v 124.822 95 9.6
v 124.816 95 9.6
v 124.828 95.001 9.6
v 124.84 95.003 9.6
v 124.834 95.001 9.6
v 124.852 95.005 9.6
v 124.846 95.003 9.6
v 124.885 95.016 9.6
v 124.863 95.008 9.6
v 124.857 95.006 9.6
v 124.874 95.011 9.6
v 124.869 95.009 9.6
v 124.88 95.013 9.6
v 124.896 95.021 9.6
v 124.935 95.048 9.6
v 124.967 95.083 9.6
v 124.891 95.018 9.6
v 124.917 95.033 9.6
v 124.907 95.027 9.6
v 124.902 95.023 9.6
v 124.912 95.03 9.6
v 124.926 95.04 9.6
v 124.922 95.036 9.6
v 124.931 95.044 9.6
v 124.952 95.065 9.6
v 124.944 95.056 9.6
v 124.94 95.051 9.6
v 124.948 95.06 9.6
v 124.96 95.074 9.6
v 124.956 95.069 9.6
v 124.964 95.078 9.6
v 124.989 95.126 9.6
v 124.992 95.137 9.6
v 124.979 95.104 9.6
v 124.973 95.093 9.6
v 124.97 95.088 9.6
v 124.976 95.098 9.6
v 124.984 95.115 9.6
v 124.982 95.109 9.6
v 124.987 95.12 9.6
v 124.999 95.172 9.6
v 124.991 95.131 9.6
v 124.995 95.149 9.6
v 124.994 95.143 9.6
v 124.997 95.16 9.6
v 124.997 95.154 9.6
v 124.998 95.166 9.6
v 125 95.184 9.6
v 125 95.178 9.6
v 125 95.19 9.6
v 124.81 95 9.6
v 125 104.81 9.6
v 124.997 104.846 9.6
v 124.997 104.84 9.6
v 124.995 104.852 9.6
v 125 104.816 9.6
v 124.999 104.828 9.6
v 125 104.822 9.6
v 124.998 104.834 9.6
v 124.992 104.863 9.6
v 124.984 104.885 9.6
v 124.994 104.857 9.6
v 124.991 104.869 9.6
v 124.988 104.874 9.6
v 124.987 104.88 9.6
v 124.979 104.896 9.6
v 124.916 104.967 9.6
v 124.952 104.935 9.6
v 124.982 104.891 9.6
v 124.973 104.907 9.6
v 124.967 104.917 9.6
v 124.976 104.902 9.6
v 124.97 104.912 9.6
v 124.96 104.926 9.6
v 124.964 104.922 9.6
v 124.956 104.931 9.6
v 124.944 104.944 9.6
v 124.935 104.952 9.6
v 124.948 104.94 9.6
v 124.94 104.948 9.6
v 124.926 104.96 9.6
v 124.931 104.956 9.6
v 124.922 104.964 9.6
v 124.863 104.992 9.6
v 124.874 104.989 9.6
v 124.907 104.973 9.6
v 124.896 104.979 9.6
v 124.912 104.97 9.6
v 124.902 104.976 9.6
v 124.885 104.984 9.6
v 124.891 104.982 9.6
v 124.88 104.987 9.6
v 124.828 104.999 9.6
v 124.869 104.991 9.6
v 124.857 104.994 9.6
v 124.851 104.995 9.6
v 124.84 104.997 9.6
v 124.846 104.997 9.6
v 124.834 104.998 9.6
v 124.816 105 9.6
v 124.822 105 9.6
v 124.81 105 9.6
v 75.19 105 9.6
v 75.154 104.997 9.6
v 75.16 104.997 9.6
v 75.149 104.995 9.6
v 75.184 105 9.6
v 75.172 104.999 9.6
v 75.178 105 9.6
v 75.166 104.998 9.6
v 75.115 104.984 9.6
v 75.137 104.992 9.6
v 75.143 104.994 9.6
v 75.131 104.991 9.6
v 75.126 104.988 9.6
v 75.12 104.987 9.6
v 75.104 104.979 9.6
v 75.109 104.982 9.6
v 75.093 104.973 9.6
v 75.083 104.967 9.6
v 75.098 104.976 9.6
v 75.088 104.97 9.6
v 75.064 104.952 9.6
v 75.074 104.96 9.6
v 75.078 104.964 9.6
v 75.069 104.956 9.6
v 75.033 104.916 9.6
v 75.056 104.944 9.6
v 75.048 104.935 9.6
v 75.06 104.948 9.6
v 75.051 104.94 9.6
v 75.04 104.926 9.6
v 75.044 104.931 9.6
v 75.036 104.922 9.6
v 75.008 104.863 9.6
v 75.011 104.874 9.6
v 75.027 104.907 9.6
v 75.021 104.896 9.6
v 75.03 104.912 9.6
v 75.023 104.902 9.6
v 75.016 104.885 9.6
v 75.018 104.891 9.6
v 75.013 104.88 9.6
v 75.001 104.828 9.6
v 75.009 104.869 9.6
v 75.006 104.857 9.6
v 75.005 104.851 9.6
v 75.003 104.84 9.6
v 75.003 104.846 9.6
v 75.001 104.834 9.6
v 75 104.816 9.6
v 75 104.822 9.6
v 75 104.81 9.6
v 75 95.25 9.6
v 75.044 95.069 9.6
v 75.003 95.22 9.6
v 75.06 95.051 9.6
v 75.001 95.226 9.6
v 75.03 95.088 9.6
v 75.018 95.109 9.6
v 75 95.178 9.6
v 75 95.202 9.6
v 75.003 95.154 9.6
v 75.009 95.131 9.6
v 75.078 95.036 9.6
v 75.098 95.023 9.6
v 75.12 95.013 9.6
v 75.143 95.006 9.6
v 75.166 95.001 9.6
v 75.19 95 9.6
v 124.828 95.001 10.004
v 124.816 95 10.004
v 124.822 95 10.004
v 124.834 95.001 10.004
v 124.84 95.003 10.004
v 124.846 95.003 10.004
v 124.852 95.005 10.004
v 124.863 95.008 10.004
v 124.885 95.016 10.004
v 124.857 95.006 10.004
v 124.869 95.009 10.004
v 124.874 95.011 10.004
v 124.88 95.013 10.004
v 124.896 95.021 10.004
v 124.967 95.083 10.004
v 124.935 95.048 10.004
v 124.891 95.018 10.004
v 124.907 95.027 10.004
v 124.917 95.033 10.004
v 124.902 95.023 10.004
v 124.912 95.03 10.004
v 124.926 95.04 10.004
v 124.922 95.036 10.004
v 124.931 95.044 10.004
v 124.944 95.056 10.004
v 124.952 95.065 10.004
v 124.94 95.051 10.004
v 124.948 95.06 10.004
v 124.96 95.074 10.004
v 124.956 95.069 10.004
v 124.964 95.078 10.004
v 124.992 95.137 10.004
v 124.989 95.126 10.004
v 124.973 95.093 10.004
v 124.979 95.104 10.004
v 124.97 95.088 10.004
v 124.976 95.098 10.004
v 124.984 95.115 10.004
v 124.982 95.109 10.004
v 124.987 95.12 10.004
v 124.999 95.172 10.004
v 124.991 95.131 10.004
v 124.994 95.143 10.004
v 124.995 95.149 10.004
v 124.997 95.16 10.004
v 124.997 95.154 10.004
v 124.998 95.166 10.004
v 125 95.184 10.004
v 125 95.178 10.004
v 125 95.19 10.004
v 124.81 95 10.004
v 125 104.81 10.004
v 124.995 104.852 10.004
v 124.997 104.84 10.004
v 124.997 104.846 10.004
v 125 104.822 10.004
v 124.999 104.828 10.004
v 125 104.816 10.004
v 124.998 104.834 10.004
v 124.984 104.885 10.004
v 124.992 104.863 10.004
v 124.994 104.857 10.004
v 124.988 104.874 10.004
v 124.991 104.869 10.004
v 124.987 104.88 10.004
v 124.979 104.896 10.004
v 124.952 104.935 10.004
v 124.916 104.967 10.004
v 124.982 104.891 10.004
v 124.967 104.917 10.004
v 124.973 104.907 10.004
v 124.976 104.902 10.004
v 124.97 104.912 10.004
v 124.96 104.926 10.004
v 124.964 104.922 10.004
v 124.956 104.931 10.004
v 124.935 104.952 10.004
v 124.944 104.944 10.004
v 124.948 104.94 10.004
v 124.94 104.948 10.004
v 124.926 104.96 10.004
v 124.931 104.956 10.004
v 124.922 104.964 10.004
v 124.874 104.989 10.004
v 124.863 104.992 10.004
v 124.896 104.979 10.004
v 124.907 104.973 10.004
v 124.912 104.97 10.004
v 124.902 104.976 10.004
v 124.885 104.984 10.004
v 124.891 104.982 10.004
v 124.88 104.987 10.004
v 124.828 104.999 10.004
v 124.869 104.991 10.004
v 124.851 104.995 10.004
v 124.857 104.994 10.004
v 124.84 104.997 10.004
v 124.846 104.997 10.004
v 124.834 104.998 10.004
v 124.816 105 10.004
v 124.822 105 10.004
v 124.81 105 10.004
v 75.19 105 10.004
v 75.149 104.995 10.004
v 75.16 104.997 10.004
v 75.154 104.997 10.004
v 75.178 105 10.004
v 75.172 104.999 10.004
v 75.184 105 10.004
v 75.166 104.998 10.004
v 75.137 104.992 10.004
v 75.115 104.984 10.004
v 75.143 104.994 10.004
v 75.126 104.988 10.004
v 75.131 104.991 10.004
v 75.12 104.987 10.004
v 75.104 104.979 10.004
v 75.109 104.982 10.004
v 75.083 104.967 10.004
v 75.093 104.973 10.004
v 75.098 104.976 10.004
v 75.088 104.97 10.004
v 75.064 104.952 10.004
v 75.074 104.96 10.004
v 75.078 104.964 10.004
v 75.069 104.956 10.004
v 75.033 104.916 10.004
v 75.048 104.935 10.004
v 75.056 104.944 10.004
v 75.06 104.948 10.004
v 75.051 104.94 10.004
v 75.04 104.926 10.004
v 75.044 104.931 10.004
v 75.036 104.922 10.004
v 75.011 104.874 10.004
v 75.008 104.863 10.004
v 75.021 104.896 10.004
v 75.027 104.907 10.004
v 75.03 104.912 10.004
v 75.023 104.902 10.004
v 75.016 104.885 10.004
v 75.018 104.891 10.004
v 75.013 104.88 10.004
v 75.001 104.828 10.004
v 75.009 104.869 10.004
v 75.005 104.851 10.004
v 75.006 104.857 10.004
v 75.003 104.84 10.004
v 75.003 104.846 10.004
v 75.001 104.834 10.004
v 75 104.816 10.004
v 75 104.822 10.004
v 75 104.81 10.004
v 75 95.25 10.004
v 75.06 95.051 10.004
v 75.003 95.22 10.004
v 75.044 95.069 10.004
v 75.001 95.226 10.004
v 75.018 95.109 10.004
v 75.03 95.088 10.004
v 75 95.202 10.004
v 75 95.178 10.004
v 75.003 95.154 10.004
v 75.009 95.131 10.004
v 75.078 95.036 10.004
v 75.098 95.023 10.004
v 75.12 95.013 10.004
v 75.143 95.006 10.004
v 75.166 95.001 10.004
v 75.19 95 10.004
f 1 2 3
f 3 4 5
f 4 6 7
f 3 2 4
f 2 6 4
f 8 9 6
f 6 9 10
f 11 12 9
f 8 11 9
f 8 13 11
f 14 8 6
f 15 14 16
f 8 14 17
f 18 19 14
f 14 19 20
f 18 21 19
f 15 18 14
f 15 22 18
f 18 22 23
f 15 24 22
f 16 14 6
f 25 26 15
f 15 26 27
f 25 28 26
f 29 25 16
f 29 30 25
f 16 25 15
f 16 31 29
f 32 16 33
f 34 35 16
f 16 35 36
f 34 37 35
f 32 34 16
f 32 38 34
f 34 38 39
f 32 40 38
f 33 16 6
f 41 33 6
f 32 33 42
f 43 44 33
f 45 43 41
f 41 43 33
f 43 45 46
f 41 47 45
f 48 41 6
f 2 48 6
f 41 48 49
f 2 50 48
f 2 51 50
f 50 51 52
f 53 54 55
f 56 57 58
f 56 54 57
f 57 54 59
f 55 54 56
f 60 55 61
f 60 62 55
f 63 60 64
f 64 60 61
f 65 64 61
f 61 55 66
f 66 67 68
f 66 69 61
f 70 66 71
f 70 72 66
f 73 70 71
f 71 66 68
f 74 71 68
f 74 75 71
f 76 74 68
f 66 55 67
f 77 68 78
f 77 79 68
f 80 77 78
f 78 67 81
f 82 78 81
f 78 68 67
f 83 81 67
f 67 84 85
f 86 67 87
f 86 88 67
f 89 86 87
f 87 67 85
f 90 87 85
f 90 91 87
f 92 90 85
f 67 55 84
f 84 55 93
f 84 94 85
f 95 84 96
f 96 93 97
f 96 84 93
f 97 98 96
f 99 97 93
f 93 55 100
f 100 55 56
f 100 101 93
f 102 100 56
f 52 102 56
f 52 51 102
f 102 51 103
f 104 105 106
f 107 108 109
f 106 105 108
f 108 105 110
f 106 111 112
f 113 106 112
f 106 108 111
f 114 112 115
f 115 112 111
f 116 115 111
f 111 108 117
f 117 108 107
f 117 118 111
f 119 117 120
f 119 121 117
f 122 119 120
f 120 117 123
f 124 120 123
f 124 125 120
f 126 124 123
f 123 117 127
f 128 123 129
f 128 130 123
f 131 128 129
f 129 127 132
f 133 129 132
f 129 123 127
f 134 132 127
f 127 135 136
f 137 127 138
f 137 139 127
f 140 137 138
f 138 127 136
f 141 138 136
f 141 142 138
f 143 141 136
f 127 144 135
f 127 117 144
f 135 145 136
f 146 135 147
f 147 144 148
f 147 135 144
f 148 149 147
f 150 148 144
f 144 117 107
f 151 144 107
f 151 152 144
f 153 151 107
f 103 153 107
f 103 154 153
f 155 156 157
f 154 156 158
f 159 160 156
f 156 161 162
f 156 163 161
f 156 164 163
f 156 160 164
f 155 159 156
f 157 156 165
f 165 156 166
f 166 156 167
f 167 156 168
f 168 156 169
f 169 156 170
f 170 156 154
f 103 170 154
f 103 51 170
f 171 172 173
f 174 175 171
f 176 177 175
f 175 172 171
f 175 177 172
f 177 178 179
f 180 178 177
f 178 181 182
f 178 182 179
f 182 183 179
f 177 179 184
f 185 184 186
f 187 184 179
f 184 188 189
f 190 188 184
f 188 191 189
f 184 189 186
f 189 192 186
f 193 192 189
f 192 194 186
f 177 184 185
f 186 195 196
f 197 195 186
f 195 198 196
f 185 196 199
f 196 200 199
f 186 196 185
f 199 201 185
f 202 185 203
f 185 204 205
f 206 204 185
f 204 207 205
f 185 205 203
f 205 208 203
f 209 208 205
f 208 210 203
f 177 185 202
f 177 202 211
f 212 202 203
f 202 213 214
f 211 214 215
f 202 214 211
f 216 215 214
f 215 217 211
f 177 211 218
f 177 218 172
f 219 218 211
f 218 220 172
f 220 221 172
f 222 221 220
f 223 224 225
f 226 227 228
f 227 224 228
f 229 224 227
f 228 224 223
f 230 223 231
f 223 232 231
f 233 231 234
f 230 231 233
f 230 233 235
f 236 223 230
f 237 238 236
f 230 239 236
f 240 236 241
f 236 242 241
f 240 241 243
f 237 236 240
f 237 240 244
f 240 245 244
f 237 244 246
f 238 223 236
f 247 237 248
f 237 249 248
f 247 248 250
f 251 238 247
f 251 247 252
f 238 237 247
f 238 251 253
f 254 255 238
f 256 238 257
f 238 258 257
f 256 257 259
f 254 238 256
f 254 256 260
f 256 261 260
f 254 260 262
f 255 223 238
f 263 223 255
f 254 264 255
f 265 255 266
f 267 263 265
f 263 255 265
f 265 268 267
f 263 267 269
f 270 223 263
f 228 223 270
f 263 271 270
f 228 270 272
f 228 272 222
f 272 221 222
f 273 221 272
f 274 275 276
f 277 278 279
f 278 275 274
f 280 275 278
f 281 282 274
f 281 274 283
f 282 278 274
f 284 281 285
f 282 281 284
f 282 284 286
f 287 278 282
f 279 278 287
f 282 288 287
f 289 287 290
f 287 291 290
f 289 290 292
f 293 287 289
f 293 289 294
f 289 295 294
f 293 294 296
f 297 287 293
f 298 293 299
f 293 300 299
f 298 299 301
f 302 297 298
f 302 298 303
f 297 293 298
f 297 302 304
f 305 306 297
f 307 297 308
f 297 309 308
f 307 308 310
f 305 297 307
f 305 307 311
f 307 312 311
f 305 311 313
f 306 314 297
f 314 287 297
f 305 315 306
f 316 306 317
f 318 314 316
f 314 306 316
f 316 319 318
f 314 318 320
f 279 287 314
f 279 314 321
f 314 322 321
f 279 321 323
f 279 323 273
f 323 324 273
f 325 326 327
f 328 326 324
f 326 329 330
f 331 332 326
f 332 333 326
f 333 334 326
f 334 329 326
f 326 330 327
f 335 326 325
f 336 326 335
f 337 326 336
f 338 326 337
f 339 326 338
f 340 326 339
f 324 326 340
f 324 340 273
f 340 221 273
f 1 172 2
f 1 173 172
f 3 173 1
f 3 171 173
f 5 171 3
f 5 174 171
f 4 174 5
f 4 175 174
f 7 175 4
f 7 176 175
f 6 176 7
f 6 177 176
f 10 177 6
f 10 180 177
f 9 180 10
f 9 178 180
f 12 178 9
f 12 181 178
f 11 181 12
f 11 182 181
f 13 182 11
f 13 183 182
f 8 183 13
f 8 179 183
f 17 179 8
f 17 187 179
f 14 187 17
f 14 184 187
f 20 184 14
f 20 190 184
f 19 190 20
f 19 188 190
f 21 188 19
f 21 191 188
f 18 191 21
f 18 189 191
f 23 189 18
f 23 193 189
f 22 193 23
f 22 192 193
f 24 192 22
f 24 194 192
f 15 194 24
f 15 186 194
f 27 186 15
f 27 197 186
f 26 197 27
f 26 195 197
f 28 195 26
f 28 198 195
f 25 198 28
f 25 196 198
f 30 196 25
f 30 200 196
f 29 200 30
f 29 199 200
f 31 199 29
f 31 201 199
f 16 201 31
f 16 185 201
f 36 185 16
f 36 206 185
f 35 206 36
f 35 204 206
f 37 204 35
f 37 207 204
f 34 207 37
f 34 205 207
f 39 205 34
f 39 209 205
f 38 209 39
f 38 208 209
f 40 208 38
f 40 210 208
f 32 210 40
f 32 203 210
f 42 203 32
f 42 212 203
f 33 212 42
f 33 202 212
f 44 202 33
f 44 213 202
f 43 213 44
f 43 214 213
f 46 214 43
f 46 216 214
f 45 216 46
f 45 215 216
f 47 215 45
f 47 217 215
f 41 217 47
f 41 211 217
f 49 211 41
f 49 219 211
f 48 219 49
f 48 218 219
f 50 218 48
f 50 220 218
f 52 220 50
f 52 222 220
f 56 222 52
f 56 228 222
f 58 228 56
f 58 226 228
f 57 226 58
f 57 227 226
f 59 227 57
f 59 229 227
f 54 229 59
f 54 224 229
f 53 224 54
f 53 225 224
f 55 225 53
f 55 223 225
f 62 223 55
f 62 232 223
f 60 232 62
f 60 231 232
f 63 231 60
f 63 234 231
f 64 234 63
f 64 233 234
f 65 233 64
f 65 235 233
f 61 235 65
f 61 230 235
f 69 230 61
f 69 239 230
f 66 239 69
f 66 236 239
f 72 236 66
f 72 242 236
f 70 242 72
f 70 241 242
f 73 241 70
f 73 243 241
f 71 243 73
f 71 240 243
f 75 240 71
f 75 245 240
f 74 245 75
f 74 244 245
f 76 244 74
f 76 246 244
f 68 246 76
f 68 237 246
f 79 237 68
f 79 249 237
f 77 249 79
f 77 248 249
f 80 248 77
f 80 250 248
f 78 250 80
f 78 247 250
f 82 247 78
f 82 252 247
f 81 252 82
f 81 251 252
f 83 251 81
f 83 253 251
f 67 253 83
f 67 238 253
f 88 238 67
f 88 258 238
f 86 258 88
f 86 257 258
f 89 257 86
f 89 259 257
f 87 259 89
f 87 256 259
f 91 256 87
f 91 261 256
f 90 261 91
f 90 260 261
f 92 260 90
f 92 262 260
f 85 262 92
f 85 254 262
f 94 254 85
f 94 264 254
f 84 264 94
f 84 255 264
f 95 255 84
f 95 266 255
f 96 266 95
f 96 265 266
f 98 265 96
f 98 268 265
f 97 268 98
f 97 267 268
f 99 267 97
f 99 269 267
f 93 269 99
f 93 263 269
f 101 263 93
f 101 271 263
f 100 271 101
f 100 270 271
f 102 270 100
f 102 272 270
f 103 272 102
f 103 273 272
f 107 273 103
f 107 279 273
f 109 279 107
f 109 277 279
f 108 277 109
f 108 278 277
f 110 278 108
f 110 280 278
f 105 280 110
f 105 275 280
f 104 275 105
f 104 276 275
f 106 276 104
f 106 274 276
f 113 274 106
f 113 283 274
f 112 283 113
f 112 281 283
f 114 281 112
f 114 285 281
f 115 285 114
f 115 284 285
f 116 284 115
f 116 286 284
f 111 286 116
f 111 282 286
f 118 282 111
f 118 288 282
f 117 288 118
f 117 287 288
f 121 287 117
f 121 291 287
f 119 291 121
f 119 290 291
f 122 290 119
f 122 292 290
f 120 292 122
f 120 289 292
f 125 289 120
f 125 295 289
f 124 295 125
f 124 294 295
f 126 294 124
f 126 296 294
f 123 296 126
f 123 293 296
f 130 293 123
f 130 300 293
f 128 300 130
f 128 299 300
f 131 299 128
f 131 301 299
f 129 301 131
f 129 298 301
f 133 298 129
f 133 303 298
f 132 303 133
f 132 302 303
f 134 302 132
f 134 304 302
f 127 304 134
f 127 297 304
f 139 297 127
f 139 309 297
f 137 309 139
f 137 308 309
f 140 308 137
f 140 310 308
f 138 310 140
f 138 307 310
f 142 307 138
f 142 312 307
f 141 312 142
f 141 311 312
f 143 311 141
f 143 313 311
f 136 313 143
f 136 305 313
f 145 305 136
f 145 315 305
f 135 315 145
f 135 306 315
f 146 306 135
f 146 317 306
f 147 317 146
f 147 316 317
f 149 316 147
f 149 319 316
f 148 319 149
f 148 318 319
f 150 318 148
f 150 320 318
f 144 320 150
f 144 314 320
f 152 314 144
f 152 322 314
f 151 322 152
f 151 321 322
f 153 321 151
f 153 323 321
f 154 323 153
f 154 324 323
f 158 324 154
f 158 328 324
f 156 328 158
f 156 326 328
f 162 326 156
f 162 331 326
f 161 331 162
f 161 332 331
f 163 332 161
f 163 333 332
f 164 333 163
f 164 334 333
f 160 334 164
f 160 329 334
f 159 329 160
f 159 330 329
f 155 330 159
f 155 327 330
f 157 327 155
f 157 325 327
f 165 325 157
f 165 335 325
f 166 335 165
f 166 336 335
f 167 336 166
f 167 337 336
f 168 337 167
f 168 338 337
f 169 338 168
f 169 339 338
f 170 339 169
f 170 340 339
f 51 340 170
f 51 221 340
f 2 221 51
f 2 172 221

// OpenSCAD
module drawBasicShape(x1, y1, x2, y2, width)
{
	length = sqrt((x1-x2)*(x1-x2) + (y1-y2)*(y1-y2));
	if (width!=0.0) {
		square(size = [width, length], center = false);
		translate([width/2.0, 0, 0]) circle(d=width);
		translate([width/2.0, length, 0]) circle(d=width);
	}
}

module translateAndRotate(x1, y1, x2, y2, width)
{
	if (width != 0.0) {
		angle = atan((y2-y1)/(x2-x1)) +270;
		if (x2>=x1) {
			translate([x1, y1, 0.0]) rotate([0.0, 0.0, angle]) translate([-width/2.0, 0.0, 0.0]) scale([1.0, 1.0, 1.0]) drawBasicShape(x1, y1, x2, y2, width);
		}
		else {
			translate([x1, y1, 0.0]) rotate([0.0, 0.0, angle+180]) translate([-width/2.0, 0.0, 0.0]) scale([1.0, 1.0, 1.0]) drawBasicShape(x1, y1, x2, y2, width);		}
	}
}

$fn=50;

points23 = [
[75.77800000, 95.77800000, 0.00000000],
[124.22200000, 95.77800000, 0.37999672],
[124.22200000, 104.22200000, 0.37997788],
[75.77800000, 104.22200000, 0.37999548],
[75.77800000, 95.83800000, 0.37998140],
[75.48400000, 95.48400000, 0.00000000],
[124.51600000, 95.48400000, 0.37999746],
[124.51600000, 104.51600000, 0.37998977],
[75.48400000, 104.51600000, 0.37999868],
[75.48400000, 95.54400000, 0.37998644],
[75.19000000, 95.19000000, 0.00000000],
[124.81000000, 95.19000000, 0.37999939],
[124.81000000, 104.81000000, 0.38000021],
[75.19000000, 104.81000000, 0.38000060],
[75.19000000, 95.25000000, 0.37999715],
[75.53600000, 95.39000000, 0.00000000],
[76.11100000, 95.94600000, 0.00000000],
[75.94600000, 96.11100000, 0.37961375],
[75.94600000, 96.52800000, 0.38001190],
[76.52800000, 95.94600000, 0.37989934],
[76.94500000, 95.94600000, 0.38015610],
[75.94600000, 96.94500000, 0.37994651],
[75.94600000, 97.36200000, 0.38001190],
[77.36200000, 95.94600000, 0.37999592],
[77.77900000, 95.94600000, 0.38001190],
[75.94600000, 97.77900000, 0.37999966],
[75.94600000, 98.19600000, 0.38015610],
[78.19600000, 95.94600000, 0.38000201],
[78.61300000, 95.94600000, 0.38001190],
[75.94600000, 98.61300000, 0.38001957],
[75.94600000, 99.03000000, 0.38001190],
[79.03000000, 95.94600000, 0.38001859],
[79.44700000, 95.94600000, 0.38015610],
[75.94600000, 99.44700000, 0.38001785],
[75.94600000, 99.86400000, 0.38001190],
[79.86400000, 95.94600000, 0.38002811],
[80.28100000, 95.94600000, 0.38001190],
[75.94600000, 100.28100000, 0.38002660],
[75.94600000, 100.69800000, 0.38001190],
[80.69800000, 95.94600000, 0.38003429],
[81.11500000, 95.94600000, 0.38001190],
[75.94600000, 101.11500000, 0.38003252],
[75.94600000, 101.53300000, 0.37930814],
[81.53300000, 95.94600000, 0.37997836],
[81.95000000, 95.94600000, 0.38001190],
[75.94600000, 101.95000000, 0.37998780],
[75.94600000, 102.36700000, 0.38001190],
[82.36700000, 95.94600000, 0.37998277],
[82.78400000, 95.94600000, 0.38015610],
[75.94600000, 102.78400000, 0.37999079],
[75.94600000, 103.20100000, 0.38001190],
[83.20100000, 95.94600000, 0.37999203],
[83.61800000, 95.94600000, 0.38001190],
[75.94600000, 103.61800000, 0.37999868],
[75.95600000, 104.02400000, 0.38048727],
[84.03500000, 95.94600000, 0.38000275],
[84.45200000, 95.94600000, 0.38001190],
[76.34400000, 104.05400000, 0.38000229],
[76.76100000, 104.05400000, 0.38015610],
[84.86900000, 95.94600000, 0.38000229],
[85.28600000, 95.94600000, 0.38001190],
[77.17800000, 104.05400000, 0.38000754],
[77.59500000, 104.05400000, 0.38001190],
[85.70300000, 95.94600000, 0.38000229],
[86.12000000, 95.94600000, 0.38001190],
[78.01200000, 104.05400000, 0.38000754],
[78.42900000, 104.05400000, 0.38001190],
[86.53700000, 95.94600000, 0.38000229],
[86.95400000, 95.94600000, 0.38015610],
[78.84600000, 104.05400000, 0.38000229],
[79.26300000, 104.05400000, 0.38001190],
[87.37100000, 95.94600000, 0.38000754],
[87.78900000, 95.94600000, 0.37930814],
[79.68000000, 104.05400000, 0.37998415],
[80.09700000, 104.05400000, 0.38001190],
[88.20600000, 95.94600000, 0.37998940],
[88.62300000, 95.94600000, 0.38001190],
[80.51500000, 104.05400000, 0.38000229],
[80.93200000, 104.05400000, 0.38015610],
[89.04000000, 95.94600000, 0.38000229],
[89.45700000, 95.94600000, 0.38001190],
[81.34900000, 104.05400000, 0.38000229],
[81.76600000, 104.05400000, 0.38015610],
[89.87400000, 95.94600000, 0.38000229],
[90.29100000, 95.94600000, 0.38001190],
[82.18300000, 104.05400000, 0.38000754],
[82.60000000, 104.05400000, 0.38001190],
[90.70800000, 95.94600000, 0.38000229],
[91.12500000, 95.94600000, 0.38015610],
[83.01700000, 104.05400000, 0.38000229],
[83.43400000, 104.05400000, 0.38001190],
[91.54200000, 95.94600000, 0.38000229],
[91.95900000, 95.94600000, 0.38015610],
[83.85100000, 104.05400000, 0.38000229],
[84.26800000, 104.05400000, 0.38001190],
[92.37600000, 95.94600000, 0.38000754],
[92.79300000, 95.94600000, 0.38001190],
[84.68500000, 104.05400000, 0.38000229],
[85.10200000, 104.05400000, 0.38001190],
[93.21000000, 95.94600000, 0.38000754],
[93.62700000, 95.94600000, 0.38001190],
[85.51900000, 104.05400000, 0.38000229],
[85.93600000, 104.05400000, 0.38015610],
[94.04400000, 95.94600000, 0.38000229],
[94.46200000, 95.94600000, 0.37930814],
[86.35300000, 104.05400000, 0.37998940],
[86.77000000, 104.05400000, 0.38001190],
[94.87900000, 95.94600000, 0.37998415],
[95.29600000, 95.94600000, 0.38001190],
[87.18800000, 104.05400000, 0.38000754],
[87.60500000, 104.05400000, 0.38001190],
[95.71300000, 95.94600000, 0.38000229],
[96.13000000, 95.94600000, 0.38015610],
[88.02200000, 104.05400000, 0.38000229],
[88.43900000, 104.05400000, 0.38001190],
[96.54700000, 95.94600000, 0.38000754],
[96.96400000, 95.94600000, 0.38001190],
[88.85600000, 104.05400000, 0.38000229],
[89.27300000, 104.05400000, 0.38001190],
[97.38100000, 95.94600000, 0.38000754],
[97.79800000, 95.94600000, 0.38001190],
[89.69000000, 104.05400000, 0.38000229],
[90.10700000, 104.05400000, 0.38015610],
[98.21500000, 95.94600000, 0.38000229],
[98.63200000, 95.94600000, 0.38001190],
[90.52400000, 104.05400000, 0.38000754],
[90.94100000, 104.05400000, 0.38001190],
[99.04900000, 95.94600000, 0.38000229],
[99.46600000, 95.94600000, 0.38001190],
[91.35800000, 104.05400000, 0.38000754],
[91.77500000, 104.05400000, 0.38001190],
[99.88300000, 95.94600000, 0.38000229],
[100.30000000, 95.94600000, 0.38015610],
[92.19200000, 104.05400000, 0.38000229],
[92.60900000, 104.05400000, 0.38001190],
[100.71800000, 95.94600000, 0.37998940],
[101.13500000, 95.94600000, 0.38001190],
[93.02600000, 104.05400000, 0.37998415],
[93.44400000, 104.05400000, 0.37930814],
[101.55200000, 95.94600000, 0.38000754],
[101.96900000, 95.94600000, 0.38001190],
[93.86100000, 104.05400000, 0.38000229],
[94.27800000, 104.05400000, 0.38015610],
[102.38600000, 95.94600000, 0.38000229],
[102.80300000, 95.94600000, 0.38001190],
[94.69500000, 104.05400000, 0.38000754],
[95.11200000, 104.05400000, 0.38001190],
[103.22000000, 95.94600000, 0.38000229],
[103.63700000, 95.94600000, 0.38001190],
[95.52900000, 104.05400000, 0.38000754],
[95.94600000, 104.05400000, 0.38001190],
[104.05400000, 95.94600000, 0.38000229],
[104.47100000, 95.94600000, 0.38015610],
[96.36300000, 104.05400000, 0.38000229],
[96.78000000, 104.05400000, 0.38001190],
[104.88800000, 95.94600000, 0.38000754],
[105.30500000, 95.94600000, 0.38001190],
[97.19700000, 104.05400000, 0.38000229],
[97.61400000, 104.05400000, 0.38001190],
[105.72200000, 95.94600000, 0.38000754],
[106.13900000, 95.94600000, 0.38001190],
[98.03100000, 104.05400000, 0.38000229],
[98.44800000, 104.05400000, 0.38015610],
[106.55600000, 95.94600000, 0.38000229],
[106.97300000, 95.94600000, 0.38001190],
[98.86500000, 104.05400000, 0.38000754],
[99.28200000, 104.05400000, 0.38001190],
[107.39100000, 95.94600000, 0.37998415],
[107.80800000, 95.94600000, 0.38001190],
[99.69900000, 104.05400000, 0.37998940],
[100.11700000, 104.05400000, 0.37930814],
[108.22500000, 95.94600000, 0.38000229],
[108.64200000, 95.94600000, 0.38015610],
[100.53400000, 104.05400000, 0.38000229],
[100.95100000, 104.05400000, 0.38001190],
[109.05900000, 95.94600000, 0.38000754],
[109.47600000, 95.94600000, 0.38001190],
[101.36800000, 104.05400000, 0.38000229],
[101.78500000, 104.05400000, 0.38001190],
[109.89300000, 95.94600000, 0.38000754],
[110.31000000, 95.94600000, 0.38001190],
[102.20200000, 104.05400000, 0.38000229],
[102.61900000, 104.05400000, 0.38015610],
[110.72700000, 95.94600000, 0.38000229],
[111.14400000, 95.94600000, 0.38001190],
[103.03600000, 104.05400000, 0.38000754],
[103.45300000, 104.05400000, 0.38001190],
[111.56100000, 95.94600000, 0.38000229],
[111.97800000, 95.94600000, 0.38001190],
[103.87000000, 104.05400000, 0.38000754],
[104.28700000, 104.05400000, 0.38001190],
[112.39500000, 95.94600000, 0.38000229],
[112.81200000, 95.94600000, 0.38015610],
[104.70400000, 104.05400000, 0.38000229],
[105.12100000, 104.05400000, 0.38001190],
[113.22900000, 95.94600000, 0.38000754],
[113.64700000, 95.94600000, 0.37930814],
[105.53800000, 104.05400000, 0.37998415],
[105.95500000, 104.05400000, 0.38001190],
[114.06400000, 95.94600000, 0.37998940],
[114.48100000, 95.94600000, 0.38001190],
[106.37300000, 104.05400000, 0.38000229],
[106.79000000, 104.05400000, 0.38015610],
[114.89800000, 95.94600000, 0.38000229],
[115.31500000, 95.94600000, 0.38001190],
[107.20700000, 104.05400000, 0.38000754],
[107.62400000, 104.05400000, 0.38001190],
[115.73200000, 95.94600000, 0.38000229],
[116.14900000, 95.94600000, 0.38001190],
[108.04100000, 104.05400000, 0.38000754],
[108.45800000, 104.05400000, 0.38001190],
[116.56600000, 95.94600000, 0.38000229],
[116.98300000, 95.94600000, 0.38015610],
[108.87500000, 104.05400000, 0.38000229],
[109.29200000, 104.05400000, 0.38001190],
[117.40000000, 95.94600000, 0.38000754],
[117.81700000, 95.94600000, 0.38001190],
[109.70900000, 104.05400000, 0.38000229],
[110.12600000, 104.05400000, 0.38001190],
[118.23400000, 95.94600000, 0.38000754],
[118.65100000, 95.94600000, 0.38001190],
[110.54300000, 104.05400000, 0.38000229],
[110.96000000, 104.05400000, 0.38015610],
[119.06800000, 95.94600000, 0.38000229],
[119.48500000, 95.94600000, 0.38001190],
[111.37700000, 104.05400000, 0.38000754],
[111.79400000, 104.05400000, 0.38001190],
[119.90200000, 95.94600000, 0.38000229],
[120.32000000, 95.94600000, 0.37930814],
[112.21100000, 104.05400000, 0.37998940],
[112.62900000, 104.05400000, 0.37930814],
[120.73700000, 95.94600000, 0.38000229],
[121.15400000, 95.94600000, 0.38015610],
[113.04600000, 104.05400000, 0.38000229],
[113.46300000, 104.05400000, 0.38001190],
[121.57100000, 95.94600000, 0.38000754],
[121.98800000, 95.94600000, 0.38001190],
[113.88000000, 104.05400000, 0.38000229],
[114.29700000, 104.05400000, 0.38001190],
[122.40500000, 95.94600000, 0.38000754],
[122.82200000, 95.94600000, 0.38001190],
[114.71400000, 104.05400000, 0.38000229],
[115.13100000, 104.05400000, 0.38015610],
[123.23900000, 95.94600000, 0.38000229],
[123.65600000, 95.94600000, 0.38001190],
[115.54800000, 104.05400000, 0.38000754],
[115.96500000, 104.05400000, 0.38001190],
[124.04400000, 95.97500000, 0.37998455],
[124.05400000, 96.38200000, 0.37961606],
[116.38200000, 104.05400000, 0.37999868],
[116.79900000, 104.05400000, 0.38015610],
[124.05400000, 96.79900000, 0.37999203],
[124.05400000, 97.21600000, 0.38015610],
[117.21600000, 104.05400000, 0.37999079],
[117.63300000, 104.05400000, 0.38001190],
[124.05400000, 97.63300000, 0.37998939],
[124.05400000, 98.05000000, 0.38001190],
[118.05000000, 104.05400000, 0.37998780],
[118.46700000, 104.05400000, 0.38001190],
[124.05400000, 98.46700000, 0.37998597],
[124.05400000, 98.88400000, 0.38001190],
[118.88400000, 104.05400000, 0.37997562],
[119.30200000, 104.05400000, 0.37930814],
[124.05400000, 99.30200000, 0.38003429],
[124.05400000, 99.71900000, 0.38001190],
[119.71900000, 104.05400000, 0.38003640],
[120.13600000, 104.05400000, 0.38001190],
[124.05400000, 100.13600000, 0.38002811],
[124.05400000, 100.55300000, 0.38001190],
[120.55300000, 104.05400000, 0.38002999],
[120.97000000, 104.05400000, 0.38001190],
[124.05400000, 100.97000000, 0.38003238],
[124.05400000, 101.38700000, 0.38001190],
[121.38700000, 104.05400000, 0.38001957],
[121.80400000, 104.05400000, 0.38001190],
[124.05400000, 101.80400000, 0.38002091],
[124.05400000, 102.22100000, 0.38001190],
[122.22100000, 104.05400000, 0.38002285],
[122.63800000, 104.05400000, 0.38001190],
[124.05400000, 102.63800000, 0.37999592],
[124.05400000, 103.05500000, 0.38001190],
[123.05500000, 104.05400000, 0.37998907],
[123.47200000, 104.05400000, 0.38001190],
[124.05400000, 103.47200000, 0.37997240],
[124.05400000, 103.88900000, 0.38001190],
[123.88900000, 104.05400000, 0.37961375],
];

translate([0.0, 0.0, 9.60000000]) {
	linear_extrude(height = 0.40400000, center = false, convexity = 10, twist = 0) {
		union() {
			for( i=[0:len(points23)-2] ){ 
				x1 = points23[i][0];
				y1 = points23[i][1];
				x2 = points23[i+1][0];
				y2 = points23[i+1][1];
				width = points23[i+1][2];
				translateAndRotate(x1, y1, x2, y2, width);
			}
		}
	}
}
